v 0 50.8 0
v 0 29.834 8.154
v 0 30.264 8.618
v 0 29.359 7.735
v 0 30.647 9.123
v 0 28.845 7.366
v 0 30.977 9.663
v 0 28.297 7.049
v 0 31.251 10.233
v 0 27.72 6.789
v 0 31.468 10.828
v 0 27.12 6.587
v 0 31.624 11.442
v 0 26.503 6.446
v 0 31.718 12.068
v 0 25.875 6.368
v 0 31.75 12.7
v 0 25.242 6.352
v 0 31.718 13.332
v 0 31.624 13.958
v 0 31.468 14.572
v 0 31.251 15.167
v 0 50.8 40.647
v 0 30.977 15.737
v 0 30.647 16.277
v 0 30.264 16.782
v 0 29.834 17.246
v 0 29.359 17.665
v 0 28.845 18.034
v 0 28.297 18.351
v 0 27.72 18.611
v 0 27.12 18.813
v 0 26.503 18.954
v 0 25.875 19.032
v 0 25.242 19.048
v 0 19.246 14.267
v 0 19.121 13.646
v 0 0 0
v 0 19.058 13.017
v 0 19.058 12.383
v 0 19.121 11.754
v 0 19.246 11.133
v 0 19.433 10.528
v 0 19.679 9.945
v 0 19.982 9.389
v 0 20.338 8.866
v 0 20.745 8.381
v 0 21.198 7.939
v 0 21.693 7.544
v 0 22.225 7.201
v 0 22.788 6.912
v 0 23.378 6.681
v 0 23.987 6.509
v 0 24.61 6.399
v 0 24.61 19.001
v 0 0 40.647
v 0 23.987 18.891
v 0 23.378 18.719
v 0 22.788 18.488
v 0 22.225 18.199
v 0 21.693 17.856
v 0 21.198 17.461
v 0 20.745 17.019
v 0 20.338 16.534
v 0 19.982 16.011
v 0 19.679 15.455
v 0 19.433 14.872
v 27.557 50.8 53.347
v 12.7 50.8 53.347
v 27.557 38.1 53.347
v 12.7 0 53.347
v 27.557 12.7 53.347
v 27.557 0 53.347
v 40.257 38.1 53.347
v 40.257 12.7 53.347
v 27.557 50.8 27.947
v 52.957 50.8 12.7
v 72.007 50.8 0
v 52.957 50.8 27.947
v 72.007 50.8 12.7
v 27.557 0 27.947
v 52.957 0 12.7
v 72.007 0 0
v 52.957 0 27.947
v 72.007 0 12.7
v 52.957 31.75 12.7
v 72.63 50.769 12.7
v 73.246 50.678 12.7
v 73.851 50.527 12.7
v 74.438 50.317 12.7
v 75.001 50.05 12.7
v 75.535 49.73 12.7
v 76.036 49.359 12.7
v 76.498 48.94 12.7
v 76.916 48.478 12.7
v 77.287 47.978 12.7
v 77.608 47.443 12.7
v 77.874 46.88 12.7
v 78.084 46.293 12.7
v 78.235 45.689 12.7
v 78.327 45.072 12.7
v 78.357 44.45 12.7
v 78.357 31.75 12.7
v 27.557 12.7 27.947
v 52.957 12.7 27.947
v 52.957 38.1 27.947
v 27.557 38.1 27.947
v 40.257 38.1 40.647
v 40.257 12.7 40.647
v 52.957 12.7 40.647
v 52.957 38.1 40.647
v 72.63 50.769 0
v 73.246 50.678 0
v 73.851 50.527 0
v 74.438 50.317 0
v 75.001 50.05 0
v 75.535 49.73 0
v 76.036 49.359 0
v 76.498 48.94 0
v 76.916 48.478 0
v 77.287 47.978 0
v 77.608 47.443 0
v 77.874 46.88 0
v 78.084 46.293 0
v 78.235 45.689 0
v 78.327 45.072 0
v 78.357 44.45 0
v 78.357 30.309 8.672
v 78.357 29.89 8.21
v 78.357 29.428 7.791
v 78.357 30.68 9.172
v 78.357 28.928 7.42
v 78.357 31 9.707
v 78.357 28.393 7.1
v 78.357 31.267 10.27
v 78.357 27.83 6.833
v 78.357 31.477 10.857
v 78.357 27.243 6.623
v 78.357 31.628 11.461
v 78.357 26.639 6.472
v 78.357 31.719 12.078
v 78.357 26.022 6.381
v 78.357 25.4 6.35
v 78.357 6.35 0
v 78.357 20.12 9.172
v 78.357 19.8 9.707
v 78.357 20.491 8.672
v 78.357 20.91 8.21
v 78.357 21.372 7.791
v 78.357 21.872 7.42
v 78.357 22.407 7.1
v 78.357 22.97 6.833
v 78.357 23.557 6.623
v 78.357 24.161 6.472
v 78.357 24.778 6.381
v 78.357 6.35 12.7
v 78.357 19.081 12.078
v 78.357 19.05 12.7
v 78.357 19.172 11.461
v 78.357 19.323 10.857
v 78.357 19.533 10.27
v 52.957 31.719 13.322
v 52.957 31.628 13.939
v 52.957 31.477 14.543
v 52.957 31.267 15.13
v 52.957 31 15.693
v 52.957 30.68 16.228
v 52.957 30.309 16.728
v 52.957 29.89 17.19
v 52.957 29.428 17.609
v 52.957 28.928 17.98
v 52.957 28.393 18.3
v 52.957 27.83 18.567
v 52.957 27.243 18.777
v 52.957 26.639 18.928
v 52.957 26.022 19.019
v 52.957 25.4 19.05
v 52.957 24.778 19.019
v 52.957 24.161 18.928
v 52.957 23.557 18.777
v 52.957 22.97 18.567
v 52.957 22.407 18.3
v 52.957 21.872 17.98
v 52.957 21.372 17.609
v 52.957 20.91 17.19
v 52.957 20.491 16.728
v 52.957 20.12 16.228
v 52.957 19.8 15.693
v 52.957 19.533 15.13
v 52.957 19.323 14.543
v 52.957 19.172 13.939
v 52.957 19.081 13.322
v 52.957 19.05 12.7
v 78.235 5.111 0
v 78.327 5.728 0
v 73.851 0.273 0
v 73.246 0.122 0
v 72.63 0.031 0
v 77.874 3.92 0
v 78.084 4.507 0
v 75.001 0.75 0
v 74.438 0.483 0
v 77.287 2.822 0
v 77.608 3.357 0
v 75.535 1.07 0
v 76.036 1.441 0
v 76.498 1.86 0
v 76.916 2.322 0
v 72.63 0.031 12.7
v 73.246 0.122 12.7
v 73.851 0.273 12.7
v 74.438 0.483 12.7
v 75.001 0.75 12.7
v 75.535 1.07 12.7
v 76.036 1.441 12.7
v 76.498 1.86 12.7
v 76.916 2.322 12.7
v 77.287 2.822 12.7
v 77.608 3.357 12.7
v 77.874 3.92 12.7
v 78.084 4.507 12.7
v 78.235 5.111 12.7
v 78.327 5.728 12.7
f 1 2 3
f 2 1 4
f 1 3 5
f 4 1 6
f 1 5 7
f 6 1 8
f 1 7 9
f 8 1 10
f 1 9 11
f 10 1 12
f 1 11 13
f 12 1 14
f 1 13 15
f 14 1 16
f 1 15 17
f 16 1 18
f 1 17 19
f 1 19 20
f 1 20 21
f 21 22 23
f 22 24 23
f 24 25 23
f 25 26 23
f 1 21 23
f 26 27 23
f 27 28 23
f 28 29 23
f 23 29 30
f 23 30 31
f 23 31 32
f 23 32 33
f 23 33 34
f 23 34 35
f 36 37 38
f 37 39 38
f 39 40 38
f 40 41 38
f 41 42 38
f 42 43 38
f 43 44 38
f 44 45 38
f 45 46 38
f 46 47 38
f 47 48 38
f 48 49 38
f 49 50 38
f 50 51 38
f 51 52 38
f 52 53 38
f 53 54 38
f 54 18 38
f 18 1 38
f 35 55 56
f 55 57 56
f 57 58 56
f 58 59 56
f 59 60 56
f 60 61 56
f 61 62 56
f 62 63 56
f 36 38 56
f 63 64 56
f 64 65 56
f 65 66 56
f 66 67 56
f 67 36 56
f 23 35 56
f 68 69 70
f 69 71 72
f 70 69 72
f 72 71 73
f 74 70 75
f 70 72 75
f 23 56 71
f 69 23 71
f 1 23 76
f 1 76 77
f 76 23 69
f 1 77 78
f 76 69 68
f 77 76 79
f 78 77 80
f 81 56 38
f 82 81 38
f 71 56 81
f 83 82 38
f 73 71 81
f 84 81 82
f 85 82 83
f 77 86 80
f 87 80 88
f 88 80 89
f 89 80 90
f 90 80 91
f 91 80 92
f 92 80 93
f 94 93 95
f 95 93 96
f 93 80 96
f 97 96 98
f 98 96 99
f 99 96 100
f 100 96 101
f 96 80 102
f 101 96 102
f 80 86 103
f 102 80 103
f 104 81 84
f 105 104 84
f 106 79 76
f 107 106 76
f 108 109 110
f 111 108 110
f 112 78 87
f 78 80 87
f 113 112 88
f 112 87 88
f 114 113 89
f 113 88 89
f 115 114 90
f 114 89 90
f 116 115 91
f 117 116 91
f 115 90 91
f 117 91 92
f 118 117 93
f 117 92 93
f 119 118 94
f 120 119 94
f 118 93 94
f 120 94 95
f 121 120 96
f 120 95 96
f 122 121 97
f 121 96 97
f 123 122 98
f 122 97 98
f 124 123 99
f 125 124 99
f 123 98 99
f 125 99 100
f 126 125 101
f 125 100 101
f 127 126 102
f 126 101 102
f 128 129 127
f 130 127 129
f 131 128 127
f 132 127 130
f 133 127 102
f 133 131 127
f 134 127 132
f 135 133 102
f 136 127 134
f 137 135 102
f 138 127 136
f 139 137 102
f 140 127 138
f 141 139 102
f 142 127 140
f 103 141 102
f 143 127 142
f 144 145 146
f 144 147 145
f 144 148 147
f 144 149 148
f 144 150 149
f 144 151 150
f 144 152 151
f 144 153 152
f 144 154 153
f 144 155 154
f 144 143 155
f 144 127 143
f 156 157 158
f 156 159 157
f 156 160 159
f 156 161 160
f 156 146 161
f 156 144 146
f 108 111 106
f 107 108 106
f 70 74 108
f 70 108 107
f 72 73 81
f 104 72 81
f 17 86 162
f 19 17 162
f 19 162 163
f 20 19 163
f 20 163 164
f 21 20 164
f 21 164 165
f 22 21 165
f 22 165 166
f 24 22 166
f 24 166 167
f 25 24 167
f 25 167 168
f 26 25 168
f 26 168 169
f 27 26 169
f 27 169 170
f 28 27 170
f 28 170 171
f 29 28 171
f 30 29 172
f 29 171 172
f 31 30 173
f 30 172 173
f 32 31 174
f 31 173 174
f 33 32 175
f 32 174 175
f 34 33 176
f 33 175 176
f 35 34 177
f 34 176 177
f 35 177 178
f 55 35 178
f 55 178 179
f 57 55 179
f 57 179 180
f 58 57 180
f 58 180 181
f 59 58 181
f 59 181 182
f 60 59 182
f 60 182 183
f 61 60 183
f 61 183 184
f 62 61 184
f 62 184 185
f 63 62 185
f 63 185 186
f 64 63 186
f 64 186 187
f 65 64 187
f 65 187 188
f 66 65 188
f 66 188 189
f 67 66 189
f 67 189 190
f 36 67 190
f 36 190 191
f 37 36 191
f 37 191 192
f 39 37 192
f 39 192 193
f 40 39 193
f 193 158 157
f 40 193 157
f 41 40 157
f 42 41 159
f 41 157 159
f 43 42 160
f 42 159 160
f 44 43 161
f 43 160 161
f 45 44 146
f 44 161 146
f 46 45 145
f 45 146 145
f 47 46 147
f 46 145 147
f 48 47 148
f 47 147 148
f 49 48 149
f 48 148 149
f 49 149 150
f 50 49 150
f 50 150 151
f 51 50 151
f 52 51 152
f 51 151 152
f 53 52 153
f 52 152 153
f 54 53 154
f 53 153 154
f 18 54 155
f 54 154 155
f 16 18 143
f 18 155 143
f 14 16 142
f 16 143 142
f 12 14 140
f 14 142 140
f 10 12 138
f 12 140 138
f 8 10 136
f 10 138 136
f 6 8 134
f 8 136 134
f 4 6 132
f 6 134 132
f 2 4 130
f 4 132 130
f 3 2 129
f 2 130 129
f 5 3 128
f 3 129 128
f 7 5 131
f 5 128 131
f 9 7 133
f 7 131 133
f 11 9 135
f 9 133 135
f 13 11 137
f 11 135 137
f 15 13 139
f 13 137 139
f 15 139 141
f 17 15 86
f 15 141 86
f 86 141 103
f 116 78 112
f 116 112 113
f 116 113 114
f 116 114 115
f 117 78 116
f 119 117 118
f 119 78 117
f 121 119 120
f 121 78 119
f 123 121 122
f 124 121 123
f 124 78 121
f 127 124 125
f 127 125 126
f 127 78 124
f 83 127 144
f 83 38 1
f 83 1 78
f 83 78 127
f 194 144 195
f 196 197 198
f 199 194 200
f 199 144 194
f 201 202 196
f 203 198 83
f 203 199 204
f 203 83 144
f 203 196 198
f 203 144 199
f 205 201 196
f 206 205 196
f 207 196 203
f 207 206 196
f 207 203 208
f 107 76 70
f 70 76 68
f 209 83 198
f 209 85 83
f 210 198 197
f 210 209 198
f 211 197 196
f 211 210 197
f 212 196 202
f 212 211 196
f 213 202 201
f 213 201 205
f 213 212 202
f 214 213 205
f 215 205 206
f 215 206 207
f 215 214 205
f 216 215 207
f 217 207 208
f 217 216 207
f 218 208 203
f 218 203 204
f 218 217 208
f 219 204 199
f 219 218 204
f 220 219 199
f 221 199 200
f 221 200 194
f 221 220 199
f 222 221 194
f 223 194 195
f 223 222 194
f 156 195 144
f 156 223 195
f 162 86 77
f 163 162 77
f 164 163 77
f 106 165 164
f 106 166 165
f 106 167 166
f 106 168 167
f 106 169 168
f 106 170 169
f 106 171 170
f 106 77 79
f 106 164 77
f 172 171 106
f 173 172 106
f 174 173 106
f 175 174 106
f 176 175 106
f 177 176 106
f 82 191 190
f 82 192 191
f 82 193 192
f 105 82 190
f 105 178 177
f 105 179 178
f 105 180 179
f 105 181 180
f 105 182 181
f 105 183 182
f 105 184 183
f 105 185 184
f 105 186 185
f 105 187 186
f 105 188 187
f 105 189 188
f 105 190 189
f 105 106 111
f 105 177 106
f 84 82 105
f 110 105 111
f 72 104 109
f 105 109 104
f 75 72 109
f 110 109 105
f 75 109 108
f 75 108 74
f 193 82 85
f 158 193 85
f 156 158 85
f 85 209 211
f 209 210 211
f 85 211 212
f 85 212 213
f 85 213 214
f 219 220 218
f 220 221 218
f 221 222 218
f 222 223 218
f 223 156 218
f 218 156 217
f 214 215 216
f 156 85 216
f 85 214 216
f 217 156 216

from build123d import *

# Parameters (mm, degrees)
F0_W      = 78.3574953675
F0_H      = 53.3467046916
F1_DEPTH  = 50.8
F3_DEPTH  = 50.801
F4_W      = 25.4
F4_H      = 40.6467046916
F5_DEPTH  = 50.801
F6_W      = 12.7
F6_H      = 12.7
F7_DEPTH  = 50.801
F9_DEPTH  = 12.7
F11_DEPTH = 12.7
F13_DEPTH = 78.3584953675
F14_R     = 6.35


with BuildPart() as f1:
    # F0 (on Front) → F1 (new body)
    with BuildSketch(Plane.XZ):
        with Locations((39.1787476838, 26.6733523458)):
            Rectangle(F0_W, F0_H)
    extrude(amount=-F1_DEPTH)

    # F2 (on face) → F3 (cut, through all)
    with BuildSketch(Plane.XZ):
        Polygon((0, 53.3467046916), (0, 40.6467046916), (12.7, 53.3467046916), align=None)
    extrude(amount=-F3_DEPTH, mode=Mode.SUBTRACT)

    # F4 (on face) → F5 (cut, through all)
    with BuildSketch(Plane.XZ):
        with Locations((65.6574953675, 33.0233523458)):
            Rectangle(F4_W, F4_H)
    extrude(amount=-F5_DEPTH, mode=Mode.SUBTRACT)

    # F6 (on face) → F7 (cut, through all)
    with BuildSketch(Plane.XZ):
        with Locations((46.6074953675, 46.9967046916)):
            Rectangle(F6_W, F6_H)
    extrude(amount=-F7_DEPTH, mode=Mode.SUBTRACT)

    # F8 (on face) → F9 (cut)
    with BuildSketch(Plane.XZ):
        Polygon((27.5574953675, 27.9467046916), (52.9574953675, 27.9467046916), (52.9574953675, 40.6467046916), (40.2574953675, 40.6467046916), (40.2574953675, 53.3467046916), (27.5574953675, 53.3467046916), align=None)
    extrude(amount=-F9_DEPTH, mode=Mode.SUBTRACT)

    # F10 (on face) → F11 (cut)
    with BuildSketch(Plane(origin=(0, 50.8, 0), x_dir=(-1, 0, 0), z_dir=(0, 1, 0))):
        Polygon((-52.9574953675, 40.6467046916), (-52.9574953675, 27.9467046916), (-27.5574953675, 27.9467046916), (-27.5574953675, 53.3467046916), (-40.2574953675, 53.3467046916), (-40.2574953675, 40.6467046916), align=None)
    extrude(amount=-F11_DEPTH, mode=Mode.SUBTRACT)

    # F12 (on face) → F13 (cut, through all)
    with BuildSketch(Plane.YZ.offset(78.3574953675)):
        with BuildLine():
            ThreePointArc((19.05, 12.7), (25.4, 6.35), (31.75, 12.7))
            Line((31.75, 12.7), (19.05, 12.7))
        make_face()
        with BuildLine():
            Line((19.05, 12.7), (31.75, 12.7))
            ThreePointArc((31.75, 12.7), (25.4, 19.05), (19.05, 12.7))
        make_face()
    extrude(amount=-F13_DEPTH, mode=Mode.SUBTRACT)

    # F14
    f14_edges = [f1.edges().sort_by_distance(p)[0] for p in [
        (78.357495, 50.8, 6.35),
        (78.357495, 0, 6.35),
    ]]
    fillet(f14_edges, radius=F14_R)


solid = f1.part
